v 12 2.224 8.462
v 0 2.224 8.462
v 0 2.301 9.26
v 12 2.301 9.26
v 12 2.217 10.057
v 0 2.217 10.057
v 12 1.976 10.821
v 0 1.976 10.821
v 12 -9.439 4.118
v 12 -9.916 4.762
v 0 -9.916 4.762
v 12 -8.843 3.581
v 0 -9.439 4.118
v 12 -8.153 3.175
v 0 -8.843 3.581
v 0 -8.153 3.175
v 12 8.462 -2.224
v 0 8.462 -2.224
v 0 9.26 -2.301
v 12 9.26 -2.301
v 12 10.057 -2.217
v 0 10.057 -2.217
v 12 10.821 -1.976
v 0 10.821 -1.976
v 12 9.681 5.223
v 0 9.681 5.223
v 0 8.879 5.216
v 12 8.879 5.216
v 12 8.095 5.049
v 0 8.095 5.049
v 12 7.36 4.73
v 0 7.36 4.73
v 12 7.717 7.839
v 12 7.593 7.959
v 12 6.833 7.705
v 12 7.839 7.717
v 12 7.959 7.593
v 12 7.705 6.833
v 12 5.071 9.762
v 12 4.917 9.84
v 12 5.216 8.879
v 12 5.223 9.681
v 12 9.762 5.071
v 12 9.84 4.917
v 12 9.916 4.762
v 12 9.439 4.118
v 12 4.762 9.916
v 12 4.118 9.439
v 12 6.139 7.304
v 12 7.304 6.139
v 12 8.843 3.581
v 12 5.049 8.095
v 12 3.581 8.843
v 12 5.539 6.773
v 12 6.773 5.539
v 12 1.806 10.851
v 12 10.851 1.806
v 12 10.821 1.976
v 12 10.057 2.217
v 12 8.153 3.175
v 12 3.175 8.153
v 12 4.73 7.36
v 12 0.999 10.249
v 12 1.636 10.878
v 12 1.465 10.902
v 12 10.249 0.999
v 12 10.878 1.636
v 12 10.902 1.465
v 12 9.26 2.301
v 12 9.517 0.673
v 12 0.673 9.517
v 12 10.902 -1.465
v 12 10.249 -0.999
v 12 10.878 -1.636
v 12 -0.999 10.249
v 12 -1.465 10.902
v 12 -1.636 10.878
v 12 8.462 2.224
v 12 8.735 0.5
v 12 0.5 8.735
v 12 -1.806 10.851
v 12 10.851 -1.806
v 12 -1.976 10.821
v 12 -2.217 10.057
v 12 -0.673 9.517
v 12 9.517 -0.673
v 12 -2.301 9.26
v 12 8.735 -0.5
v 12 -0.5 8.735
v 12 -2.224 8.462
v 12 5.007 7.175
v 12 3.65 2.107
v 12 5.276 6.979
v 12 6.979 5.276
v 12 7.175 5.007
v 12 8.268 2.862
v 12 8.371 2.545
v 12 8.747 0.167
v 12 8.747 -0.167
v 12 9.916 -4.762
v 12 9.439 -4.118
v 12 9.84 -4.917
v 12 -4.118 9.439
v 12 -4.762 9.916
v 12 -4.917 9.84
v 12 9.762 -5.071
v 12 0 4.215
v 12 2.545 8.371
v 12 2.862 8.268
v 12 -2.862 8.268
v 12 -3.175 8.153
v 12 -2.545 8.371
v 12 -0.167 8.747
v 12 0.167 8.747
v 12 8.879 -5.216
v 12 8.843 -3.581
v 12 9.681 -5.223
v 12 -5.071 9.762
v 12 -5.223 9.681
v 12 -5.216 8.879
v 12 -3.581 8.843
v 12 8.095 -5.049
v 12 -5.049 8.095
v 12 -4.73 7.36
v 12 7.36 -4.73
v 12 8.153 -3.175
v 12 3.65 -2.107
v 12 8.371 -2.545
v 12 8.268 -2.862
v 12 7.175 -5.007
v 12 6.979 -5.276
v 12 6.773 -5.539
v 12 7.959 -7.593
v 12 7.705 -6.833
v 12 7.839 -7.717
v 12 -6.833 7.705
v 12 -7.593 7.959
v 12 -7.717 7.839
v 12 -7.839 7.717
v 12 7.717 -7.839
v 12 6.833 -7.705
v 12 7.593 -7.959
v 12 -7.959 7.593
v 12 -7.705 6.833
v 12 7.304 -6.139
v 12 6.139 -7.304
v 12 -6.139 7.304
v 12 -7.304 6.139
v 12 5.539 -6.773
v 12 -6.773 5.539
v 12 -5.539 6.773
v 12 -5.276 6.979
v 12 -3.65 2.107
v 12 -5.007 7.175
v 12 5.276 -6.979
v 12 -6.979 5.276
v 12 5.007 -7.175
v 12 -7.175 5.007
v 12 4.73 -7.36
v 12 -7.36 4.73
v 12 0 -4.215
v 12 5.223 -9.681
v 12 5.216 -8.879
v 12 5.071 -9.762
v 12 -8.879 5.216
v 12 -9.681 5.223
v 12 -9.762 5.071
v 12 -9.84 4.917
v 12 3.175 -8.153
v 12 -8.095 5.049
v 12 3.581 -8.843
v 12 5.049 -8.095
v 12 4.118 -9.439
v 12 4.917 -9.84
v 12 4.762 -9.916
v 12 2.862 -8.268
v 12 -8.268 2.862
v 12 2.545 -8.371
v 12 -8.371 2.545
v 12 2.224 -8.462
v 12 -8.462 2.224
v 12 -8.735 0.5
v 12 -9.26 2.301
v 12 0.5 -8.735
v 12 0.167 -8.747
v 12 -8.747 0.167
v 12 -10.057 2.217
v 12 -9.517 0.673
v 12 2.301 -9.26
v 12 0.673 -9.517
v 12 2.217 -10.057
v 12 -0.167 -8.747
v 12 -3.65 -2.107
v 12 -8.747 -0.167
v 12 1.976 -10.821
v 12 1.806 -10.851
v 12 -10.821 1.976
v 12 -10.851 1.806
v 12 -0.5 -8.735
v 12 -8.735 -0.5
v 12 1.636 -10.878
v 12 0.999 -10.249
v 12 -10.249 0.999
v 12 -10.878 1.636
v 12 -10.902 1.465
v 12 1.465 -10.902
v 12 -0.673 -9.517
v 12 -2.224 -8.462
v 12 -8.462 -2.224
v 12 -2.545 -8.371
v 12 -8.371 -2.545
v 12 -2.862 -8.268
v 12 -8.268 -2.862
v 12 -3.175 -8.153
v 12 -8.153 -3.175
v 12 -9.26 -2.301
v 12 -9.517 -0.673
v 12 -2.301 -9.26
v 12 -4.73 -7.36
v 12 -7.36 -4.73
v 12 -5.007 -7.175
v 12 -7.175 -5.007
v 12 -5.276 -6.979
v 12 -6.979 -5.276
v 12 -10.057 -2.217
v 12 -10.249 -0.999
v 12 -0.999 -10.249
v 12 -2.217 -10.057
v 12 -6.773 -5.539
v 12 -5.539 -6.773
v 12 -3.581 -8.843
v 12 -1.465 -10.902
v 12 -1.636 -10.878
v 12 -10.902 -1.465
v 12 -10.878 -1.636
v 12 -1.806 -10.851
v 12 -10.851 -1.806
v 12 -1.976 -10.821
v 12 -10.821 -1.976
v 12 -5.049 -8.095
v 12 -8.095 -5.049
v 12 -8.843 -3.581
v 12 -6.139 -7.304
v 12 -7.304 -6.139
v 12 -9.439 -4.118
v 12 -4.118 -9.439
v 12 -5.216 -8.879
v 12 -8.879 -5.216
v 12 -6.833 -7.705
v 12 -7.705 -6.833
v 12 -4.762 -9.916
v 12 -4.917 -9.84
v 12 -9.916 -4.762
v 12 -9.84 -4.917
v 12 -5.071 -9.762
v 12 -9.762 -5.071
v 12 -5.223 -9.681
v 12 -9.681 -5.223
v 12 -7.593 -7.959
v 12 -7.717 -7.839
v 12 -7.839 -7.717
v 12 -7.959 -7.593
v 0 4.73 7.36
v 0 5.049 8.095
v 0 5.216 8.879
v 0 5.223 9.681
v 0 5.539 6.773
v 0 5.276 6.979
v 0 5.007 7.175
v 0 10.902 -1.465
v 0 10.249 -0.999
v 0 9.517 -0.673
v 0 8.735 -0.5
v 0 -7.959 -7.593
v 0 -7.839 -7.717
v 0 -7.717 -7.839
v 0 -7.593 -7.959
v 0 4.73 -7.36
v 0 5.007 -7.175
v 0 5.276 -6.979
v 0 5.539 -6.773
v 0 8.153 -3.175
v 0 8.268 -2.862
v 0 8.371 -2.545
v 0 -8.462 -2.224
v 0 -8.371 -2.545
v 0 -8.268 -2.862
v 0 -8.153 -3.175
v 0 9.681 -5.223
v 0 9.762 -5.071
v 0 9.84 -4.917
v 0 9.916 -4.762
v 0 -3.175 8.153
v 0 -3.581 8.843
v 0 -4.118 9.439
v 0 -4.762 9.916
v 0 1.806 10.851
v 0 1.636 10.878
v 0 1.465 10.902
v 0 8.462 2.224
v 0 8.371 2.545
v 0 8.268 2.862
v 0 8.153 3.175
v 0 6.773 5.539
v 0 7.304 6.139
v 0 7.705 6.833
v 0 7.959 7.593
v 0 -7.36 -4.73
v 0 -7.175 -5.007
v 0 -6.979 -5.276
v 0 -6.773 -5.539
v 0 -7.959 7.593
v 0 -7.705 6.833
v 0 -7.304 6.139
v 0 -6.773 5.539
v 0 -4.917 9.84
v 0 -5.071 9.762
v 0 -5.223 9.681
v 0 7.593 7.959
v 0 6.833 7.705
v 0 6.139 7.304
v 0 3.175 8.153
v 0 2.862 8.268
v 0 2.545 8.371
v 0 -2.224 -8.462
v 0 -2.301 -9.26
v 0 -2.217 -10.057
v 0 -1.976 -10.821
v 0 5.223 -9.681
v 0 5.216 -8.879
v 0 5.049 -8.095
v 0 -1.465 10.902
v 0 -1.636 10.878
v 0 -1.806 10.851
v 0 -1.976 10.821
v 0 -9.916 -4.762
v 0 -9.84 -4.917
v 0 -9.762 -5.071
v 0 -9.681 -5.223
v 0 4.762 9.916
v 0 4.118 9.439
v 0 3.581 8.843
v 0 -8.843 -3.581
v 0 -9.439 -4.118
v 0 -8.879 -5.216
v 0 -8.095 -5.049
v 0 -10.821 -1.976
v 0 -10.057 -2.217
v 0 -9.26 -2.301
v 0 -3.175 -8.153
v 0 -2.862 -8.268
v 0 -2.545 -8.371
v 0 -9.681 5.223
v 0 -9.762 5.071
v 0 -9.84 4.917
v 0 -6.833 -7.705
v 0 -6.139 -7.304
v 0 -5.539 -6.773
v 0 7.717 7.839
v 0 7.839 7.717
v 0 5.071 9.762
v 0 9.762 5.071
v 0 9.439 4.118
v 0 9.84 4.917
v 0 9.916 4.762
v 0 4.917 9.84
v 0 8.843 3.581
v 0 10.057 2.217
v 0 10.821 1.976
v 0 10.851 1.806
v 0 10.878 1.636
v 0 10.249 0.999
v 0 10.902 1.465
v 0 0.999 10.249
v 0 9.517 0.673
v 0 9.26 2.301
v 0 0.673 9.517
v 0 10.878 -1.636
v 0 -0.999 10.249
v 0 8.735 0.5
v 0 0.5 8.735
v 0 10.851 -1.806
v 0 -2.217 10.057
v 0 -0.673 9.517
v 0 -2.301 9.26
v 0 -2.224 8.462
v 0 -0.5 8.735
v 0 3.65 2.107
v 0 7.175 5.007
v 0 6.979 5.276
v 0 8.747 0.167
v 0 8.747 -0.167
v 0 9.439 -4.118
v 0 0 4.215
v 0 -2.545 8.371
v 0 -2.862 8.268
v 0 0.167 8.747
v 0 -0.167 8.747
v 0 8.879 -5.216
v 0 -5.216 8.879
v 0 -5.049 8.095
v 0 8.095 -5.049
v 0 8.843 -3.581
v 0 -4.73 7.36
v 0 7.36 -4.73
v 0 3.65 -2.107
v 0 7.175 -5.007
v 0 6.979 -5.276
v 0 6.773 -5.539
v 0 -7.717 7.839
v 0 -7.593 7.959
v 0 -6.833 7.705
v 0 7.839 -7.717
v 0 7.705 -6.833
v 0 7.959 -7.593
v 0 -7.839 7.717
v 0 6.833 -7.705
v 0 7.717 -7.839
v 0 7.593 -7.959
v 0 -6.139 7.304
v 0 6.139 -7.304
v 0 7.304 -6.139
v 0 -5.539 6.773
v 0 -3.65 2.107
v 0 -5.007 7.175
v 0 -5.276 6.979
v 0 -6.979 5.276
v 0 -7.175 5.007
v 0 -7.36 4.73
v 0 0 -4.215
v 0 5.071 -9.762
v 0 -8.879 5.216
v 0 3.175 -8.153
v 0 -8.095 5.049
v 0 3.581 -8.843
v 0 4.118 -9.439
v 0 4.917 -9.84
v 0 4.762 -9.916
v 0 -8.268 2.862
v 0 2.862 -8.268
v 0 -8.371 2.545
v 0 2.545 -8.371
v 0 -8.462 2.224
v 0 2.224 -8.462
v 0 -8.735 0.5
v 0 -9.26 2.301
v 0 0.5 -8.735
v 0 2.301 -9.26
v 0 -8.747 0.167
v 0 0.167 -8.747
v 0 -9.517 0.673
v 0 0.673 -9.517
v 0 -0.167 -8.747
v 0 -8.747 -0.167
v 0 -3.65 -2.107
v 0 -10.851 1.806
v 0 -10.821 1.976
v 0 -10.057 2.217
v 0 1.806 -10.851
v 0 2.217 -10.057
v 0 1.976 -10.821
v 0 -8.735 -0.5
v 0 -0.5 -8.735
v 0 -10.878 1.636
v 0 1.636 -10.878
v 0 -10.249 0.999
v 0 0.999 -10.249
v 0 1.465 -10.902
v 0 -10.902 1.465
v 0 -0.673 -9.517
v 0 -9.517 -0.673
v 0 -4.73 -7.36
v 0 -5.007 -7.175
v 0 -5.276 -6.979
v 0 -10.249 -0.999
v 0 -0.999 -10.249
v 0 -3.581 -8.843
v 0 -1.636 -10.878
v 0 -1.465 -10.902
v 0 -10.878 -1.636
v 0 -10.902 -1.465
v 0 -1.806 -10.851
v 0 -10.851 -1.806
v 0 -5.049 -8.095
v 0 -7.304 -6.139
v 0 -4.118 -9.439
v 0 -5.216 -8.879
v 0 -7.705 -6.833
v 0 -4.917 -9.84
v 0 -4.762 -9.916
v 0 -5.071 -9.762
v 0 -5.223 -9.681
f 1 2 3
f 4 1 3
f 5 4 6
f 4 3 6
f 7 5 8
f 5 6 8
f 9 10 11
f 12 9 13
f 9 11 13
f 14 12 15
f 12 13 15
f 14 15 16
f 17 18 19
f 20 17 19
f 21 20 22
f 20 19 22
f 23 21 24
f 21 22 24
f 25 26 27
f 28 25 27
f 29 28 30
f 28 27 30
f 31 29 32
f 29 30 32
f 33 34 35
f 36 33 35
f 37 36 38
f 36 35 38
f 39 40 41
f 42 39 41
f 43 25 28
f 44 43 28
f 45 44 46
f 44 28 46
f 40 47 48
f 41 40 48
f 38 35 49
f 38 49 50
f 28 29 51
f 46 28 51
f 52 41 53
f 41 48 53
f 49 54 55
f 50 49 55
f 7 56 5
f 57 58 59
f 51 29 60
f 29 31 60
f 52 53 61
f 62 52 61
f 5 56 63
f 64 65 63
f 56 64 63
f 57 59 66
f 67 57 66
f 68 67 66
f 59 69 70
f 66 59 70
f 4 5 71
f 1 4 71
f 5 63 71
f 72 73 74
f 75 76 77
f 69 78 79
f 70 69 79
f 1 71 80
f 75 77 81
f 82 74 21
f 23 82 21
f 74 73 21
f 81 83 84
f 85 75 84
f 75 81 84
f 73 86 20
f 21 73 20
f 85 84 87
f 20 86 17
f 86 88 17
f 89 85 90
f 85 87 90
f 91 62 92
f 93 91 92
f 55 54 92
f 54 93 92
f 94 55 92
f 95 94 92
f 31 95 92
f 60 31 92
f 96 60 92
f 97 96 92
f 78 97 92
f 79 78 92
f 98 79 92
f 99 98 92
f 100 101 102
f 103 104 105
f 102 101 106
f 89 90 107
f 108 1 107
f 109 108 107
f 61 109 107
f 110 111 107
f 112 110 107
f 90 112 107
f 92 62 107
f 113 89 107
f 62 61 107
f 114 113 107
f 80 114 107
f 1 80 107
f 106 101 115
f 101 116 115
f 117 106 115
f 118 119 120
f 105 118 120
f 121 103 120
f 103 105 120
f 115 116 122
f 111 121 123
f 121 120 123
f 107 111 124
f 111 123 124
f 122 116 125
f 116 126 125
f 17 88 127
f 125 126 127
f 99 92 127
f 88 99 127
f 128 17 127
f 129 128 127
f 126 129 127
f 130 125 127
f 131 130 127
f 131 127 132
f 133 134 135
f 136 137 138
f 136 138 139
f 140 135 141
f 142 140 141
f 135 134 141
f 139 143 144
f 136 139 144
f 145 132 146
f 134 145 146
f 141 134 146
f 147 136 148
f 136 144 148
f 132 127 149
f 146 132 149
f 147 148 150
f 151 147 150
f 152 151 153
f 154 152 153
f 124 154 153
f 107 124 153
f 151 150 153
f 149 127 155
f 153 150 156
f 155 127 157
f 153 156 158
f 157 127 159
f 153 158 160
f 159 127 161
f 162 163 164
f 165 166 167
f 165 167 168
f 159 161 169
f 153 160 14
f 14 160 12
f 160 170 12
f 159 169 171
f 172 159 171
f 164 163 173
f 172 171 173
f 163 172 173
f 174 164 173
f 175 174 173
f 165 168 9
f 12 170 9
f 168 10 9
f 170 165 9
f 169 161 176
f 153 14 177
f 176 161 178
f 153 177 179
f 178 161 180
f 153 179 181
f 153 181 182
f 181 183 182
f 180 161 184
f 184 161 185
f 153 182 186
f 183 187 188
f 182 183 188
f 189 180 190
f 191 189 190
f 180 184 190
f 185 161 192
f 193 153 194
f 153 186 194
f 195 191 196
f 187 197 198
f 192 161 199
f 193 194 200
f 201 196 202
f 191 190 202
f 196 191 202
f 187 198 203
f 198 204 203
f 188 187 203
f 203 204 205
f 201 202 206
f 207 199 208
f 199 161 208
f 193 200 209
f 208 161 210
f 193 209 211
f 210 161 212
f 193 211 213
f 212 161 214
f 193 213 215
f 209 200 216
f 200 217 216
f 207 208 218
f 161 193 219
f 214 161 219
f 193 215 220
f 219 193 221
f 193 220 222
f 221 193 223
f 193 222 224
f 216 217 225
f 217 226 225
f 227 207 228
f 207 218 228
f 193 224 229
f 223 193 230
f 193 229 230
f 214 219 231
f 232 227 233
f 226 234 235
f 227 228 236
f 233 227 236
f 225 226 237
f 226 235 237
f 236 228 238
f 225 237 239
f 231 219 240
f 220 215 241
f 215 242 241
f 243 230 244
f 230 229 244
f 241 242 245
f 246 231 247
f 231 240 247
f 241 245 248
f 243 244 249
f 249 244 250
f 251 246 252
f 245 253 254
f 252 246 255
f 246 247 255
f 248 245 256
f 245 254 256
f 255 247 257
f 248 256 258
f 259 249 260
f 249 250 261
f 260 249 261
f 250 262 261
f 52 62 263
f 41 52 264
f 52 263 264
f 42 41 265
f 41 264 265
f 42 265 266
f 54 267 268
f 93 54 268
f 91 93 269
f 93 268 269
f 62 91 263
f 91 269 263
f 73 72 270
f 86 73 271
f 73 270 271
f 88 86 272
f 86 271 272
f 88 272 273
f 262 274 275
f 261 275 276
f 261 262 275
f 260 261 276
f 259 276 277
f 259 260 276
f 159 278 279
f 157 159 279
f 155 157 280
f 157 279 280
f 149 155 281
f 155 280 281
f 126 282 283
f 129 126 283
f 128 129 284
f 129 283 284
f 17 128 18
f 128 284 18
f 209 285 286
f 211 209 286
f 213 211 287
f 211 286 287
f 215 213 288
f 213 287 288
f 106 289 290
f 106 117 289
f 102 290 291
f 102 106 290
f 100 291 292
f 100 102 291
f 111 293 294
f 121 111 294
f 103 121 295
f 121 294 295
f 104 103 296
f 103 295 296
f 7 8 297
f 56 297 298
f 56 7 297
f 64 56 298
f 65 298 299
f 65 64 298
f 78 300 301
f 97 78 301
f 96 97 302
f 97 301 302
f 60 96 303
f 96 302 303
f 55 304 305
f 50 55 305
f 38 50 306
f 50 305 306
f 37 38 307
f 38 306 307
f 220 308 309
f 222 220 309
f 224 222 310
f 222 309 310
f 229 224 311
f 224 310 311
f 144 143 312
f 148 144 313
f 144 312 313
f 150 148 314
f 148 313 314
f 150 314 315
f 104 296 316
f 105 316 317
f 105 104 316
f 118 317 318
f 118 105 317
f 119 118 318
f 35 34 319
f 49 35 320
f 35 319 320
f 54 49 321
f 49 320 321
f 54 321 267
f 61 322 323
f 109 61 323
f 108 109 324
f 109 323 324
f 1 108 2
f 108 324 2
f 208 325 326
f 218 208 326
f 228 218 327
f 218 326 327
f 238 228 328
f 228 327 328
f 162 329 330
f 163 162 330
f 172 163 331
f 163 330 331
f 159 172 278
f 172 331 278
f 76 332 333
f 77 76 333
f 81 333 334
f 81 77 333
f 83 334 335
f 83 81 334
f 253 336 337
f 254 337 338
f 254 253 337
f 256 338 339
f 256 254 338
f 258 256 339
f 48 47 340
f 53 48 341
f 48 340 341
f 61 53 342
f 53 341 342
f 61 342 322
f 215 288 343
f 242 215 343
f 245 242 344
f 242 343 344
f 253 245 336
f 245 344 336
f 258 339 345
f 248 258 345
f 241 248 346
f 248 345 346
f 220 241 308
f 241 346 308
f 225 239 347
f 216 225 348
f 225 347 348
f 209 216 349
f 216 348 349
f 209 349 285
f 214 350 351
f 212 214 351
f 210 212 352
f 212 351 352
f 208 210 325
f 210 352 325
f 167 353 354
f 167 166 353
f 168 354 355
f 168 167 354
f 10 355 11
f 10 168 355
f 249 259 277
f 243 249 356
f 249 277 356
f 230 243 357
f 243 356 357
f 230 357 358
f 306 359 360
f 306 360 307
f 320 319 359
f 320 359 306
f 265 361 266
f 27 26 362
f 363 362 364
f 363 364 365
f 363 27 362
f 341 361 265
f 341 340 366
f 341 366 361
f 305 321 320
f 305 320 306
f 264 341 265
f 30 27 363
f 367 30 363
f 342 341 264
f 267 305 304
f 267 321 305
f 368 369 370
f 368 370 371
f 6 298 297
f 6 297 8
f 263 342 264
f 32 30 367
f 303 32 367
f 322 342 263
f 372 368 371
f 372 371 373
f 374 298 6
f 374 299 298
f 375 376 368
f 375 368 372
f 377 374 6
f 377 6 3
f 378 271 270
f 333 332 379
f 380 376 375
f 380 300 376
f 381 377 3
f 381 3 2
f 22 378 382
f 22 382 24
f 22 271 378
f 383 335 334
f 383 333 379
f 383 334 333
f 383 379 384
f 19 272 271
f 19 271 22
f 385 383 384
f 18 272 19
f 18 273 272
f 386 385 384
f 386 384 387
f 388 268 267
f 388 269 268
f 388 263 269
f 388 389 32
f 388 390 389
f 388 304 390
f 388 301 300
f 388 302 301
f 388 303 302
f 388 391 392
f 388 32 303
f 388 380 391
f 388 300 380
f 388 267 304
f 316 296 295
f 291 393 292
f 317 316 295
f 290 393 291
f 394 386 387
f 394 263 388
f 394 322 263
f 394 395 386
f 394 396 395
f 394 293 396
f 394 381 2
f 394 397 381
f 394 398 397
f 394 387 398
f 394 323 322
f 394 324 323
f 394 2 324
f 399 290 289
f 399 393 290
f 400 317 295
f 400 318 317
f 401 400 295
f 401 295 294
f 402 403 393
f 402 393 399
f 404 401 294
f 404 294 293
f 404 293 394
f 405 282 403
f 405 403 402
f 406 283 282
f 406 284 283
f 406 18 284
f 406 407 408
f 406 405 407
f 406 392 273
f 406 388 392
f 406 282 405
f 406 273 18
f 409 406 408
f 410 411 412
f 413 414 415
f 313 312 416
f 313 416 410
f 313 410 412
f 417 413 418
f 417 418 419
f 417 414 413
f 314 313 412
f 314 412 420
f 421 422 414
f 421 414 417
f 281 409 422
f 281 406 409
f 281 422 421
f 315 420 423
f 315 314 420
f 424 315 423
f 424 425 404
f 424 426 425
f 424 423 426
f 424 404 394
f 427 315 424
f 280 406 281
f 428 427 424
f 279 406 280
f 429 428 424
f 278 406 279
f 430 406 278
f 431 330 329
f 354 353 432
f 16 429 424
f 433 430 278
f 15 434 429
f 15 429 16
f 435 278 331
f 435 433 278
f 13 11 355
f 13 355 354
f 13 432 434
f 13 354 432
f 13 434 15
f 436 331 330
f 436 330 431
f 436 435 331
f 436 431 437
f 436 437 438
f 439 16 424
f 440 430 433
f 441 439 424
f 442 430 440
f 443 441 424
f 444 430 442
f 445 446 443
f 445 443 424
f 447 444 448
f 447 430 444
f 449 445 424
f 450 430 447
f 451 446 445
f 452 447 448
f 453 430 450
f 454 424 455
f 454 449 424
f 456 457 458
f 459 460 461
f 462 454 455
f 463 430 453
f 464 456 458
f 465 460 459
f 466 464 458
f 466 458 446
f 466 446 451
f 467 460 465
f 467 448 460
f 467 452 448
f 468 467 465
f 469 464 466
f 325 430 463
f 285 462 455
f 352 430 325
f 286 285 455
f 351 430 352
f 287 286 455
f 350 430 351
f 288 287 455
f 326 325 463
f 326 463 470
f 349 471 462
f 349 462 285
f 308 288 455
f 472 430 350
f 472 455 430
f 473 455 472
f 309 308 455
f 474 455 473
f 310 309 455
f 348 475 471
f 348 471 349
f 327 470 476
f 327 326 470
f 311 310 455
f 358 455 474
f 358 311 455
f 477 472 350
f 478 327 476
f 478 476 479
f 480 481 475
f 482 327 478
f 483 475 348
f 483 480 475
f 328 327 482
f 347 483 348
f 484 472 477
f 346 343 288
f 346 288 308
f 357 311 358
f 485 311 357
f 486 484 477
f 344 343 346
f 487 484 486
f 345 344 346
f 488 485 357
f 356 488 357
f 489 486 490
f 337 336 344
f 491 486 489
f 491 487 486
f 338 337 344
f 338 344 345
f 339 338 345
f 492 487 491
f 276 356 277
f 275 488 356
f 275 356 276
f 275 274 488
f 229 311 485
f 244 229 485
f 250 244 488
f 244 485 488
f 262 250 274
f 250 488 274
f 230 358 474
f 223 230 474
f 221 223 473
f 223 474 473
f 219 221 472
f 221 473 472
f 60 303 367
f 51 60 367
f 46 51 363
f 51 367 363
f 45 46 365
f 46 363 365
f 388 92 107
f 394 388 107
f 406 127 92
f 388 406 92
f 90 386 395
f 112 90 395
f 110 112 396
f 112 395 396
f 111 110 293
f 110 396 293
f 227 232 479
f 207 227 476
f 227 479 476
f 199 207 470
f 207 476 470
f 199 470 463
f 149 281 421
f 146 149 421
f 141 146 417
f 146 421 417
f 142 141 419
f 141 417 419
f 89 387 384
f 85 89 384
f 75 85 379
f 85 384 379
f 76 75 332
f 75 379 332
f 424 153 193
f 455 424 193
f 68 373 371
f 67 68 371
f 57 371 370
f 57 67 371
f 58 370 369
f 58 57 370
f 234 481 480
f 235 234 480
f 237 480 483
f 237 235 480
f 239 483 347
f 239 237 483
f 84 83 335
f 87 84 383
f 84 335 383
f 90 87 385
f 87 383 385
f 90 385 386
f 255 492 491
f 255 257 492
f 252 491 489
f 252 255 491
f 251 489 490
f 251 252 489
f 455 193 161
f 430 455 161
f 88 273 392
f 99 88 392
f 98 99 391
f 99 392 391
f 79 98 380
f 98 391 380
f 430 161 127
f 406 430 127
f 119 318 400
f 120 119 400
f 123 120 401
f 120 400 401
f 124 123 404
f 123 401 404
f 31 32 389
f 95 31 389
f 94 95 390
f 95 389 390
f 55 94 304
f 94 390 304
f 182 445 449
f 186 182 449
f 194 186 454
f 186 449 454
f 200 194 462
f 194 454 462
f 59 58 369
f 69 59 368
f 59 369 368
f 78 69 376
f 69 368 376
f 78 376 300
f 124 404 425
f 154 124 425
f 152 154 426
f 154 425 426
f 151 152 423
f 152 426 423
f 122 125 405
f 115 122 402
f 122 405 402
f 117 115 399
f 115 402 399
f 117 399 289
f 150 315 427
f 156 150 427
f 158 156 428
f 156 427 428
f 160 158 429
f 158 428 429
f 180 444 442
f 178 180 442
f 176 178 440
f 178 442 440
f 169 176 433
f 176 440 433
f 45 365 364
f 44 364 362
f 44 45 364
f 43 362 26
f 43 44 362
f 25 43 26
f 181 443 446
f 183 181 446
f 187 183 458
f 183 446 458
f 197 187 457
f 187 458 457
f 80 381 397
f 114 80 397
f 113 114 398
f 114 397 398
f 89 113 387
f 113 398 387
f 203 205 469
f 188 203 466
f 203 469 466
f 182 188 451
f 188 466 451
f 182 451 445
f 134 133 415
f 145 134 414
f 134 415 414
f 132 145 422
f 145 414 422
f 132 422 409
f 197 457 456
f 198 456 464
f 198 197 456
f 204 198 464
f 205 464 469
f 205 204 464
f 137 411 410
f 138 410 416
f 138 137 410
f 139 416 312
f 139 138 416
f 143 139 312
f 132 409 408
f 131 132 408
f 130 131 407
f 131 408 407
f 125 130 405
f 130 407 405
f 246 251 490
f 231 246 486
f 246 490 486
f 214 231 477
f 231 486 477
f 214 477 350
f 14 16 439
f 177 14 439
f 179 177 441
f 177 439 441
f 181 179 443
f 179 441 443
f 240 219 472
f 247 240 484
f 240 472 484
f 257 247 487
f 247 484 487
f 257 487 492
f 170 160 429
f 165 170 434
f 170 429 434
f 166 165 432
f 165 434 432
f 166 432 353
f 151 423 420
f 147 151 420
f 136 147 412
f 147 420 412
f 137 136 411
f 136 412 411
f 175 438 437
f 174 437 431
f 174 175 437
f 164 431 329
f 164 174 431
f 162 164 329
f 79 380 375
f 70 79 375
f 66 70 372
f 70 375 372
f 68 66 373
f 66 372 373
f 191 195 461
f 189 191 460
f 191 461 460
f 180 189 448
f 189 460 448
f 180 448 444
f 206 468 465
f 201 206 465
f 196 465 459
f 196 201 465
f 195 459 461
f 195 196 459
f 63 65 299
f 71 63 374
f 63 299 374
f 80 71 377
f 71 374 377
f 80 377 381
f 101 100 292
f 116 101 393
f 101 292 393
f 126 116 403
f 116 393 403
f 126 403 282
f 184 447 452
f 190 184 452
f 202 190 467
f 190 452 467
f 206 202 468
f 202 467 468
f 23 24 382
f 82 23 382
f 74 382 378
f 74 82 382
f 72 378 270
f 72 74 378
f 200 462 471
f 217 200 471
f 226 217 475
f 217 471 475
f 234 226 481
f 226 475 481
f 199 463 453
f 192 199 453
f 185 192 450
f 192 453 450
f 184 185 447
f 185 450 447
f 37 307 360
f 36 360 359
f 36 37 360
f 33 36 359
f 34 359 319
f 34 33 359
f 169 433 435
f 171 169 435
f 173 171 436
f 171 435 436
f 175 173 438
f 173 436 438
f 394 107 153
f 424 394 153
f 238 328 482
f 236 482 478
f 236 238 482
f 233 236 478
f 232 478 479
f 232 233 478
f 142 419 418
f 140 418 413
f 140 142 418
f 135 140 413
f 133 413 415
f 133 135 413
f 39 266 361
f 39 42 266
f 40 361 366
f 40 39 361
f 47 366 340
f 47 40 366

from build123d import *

# Parameters (mm, degrees)
BASPROSKE_W           = 12
BASPROSKE_H           = 11
TOOTHCUT_DEPTH        = 20.646882704
TEETHCUTS_COUNT       = 20
TEETHCUTS_ANGLE       = 342
BORSKE_R              = 0.4
BORE_DEPTH            = 50.0000508
KES_EKSTR_ZYON1_DEPTH = 20


with BuildPart() as part:
    # BasProSke → Base-Revolve (revolve)
    with BuildSketch(Plane(origin=(0, 0, 0), x_dir=(1, 0, 0), z_dir=(0, 1, 0)), mode=Mode.PRIVATE) as base_revolve_sk:
        with Locations((6, 5.5)):
            Rectangle(BASPROSKE_W, BASPROSKE_H)
    revolve(base_revolve_sk.sketch.rotate(Axis((-10, 0, 0), (1, 0, 0)), 180), axis=Axis((-10, 0, 0), (1, 0, 0)))

    # TooCutSke → ToothCut (cut, through all)
    with BuildSketch(Plane(origin=(0, 0, 0), x_dir=(0, 0, -1), z_dir=(1, 0, 0))):
        with BuildLine():
            ThreePointArc((0.499924007, 8.734705318), (0, 8.749), (-0.499924007, 8.734705318))
            ThreePointArc((-0.499924007, 8.734705318), (-0.824302243, 9.905497836), (-1.485192705, 10.924909509))
            ThreePointArc((-1.485192705, 10.924909509), (0, 11.0254), (1.485192705, 10.924909509))
            ThreePointArc((1.485192705, 10.924909509), (0.824302243, 9.905497836), (0.499924007, 8.734705318))
        make_face()
    toothcut = extrude(amount=TOOTHCUT_DEPTH, mode=Mode.SUBTRACT)

    # TeethCuts: ToothCut ×20 about axis
    teethcuts_axis = Axis((-10, 0, 0), (1, 0, 0))
    for i in range(1, TEETHCUTS_COUNT):
        add(toothcut.rotate(teethcuts_axis, i * TEETHCUTS_ANGLE / (TEETHCUTS_COUNT - 1)), mode=Mode.SUBTRACT)

    # BorSke → Bore (cut, symmetric)
    with BuildSketch(Plane(origin=(0, 0, 0), x_dir=(0, 0, -1), z_dir=(1, 0, 0))):
        with Locations(Location((0, 0, 0), (0, 0, 180))):
            Circle(BORSKE_R)
    extrude(amount=BORE_DEPTH, both=True, mode=Mode.SUBTRACT)

    # Çizim1 → Kes-Ekstrüzyon1 (cut)
    with BuildSketch(Plane(origin=(12, 0, 0), x_dir=(0, 0, -1), z_dir=(1, 0, 0))):
        Polygon((4.214656965, 0), (2.107328483, 3.65), (-2.107328483, 3.65), (-4.214656965, 0), (-2.107328483, -3.65), (2.107328483, -3.65), align=None)
    extrude(amount=-KES_EKSTR_ZYON1_DEPTH, mode=Mode.SUBTRACT)


solid = part.part
